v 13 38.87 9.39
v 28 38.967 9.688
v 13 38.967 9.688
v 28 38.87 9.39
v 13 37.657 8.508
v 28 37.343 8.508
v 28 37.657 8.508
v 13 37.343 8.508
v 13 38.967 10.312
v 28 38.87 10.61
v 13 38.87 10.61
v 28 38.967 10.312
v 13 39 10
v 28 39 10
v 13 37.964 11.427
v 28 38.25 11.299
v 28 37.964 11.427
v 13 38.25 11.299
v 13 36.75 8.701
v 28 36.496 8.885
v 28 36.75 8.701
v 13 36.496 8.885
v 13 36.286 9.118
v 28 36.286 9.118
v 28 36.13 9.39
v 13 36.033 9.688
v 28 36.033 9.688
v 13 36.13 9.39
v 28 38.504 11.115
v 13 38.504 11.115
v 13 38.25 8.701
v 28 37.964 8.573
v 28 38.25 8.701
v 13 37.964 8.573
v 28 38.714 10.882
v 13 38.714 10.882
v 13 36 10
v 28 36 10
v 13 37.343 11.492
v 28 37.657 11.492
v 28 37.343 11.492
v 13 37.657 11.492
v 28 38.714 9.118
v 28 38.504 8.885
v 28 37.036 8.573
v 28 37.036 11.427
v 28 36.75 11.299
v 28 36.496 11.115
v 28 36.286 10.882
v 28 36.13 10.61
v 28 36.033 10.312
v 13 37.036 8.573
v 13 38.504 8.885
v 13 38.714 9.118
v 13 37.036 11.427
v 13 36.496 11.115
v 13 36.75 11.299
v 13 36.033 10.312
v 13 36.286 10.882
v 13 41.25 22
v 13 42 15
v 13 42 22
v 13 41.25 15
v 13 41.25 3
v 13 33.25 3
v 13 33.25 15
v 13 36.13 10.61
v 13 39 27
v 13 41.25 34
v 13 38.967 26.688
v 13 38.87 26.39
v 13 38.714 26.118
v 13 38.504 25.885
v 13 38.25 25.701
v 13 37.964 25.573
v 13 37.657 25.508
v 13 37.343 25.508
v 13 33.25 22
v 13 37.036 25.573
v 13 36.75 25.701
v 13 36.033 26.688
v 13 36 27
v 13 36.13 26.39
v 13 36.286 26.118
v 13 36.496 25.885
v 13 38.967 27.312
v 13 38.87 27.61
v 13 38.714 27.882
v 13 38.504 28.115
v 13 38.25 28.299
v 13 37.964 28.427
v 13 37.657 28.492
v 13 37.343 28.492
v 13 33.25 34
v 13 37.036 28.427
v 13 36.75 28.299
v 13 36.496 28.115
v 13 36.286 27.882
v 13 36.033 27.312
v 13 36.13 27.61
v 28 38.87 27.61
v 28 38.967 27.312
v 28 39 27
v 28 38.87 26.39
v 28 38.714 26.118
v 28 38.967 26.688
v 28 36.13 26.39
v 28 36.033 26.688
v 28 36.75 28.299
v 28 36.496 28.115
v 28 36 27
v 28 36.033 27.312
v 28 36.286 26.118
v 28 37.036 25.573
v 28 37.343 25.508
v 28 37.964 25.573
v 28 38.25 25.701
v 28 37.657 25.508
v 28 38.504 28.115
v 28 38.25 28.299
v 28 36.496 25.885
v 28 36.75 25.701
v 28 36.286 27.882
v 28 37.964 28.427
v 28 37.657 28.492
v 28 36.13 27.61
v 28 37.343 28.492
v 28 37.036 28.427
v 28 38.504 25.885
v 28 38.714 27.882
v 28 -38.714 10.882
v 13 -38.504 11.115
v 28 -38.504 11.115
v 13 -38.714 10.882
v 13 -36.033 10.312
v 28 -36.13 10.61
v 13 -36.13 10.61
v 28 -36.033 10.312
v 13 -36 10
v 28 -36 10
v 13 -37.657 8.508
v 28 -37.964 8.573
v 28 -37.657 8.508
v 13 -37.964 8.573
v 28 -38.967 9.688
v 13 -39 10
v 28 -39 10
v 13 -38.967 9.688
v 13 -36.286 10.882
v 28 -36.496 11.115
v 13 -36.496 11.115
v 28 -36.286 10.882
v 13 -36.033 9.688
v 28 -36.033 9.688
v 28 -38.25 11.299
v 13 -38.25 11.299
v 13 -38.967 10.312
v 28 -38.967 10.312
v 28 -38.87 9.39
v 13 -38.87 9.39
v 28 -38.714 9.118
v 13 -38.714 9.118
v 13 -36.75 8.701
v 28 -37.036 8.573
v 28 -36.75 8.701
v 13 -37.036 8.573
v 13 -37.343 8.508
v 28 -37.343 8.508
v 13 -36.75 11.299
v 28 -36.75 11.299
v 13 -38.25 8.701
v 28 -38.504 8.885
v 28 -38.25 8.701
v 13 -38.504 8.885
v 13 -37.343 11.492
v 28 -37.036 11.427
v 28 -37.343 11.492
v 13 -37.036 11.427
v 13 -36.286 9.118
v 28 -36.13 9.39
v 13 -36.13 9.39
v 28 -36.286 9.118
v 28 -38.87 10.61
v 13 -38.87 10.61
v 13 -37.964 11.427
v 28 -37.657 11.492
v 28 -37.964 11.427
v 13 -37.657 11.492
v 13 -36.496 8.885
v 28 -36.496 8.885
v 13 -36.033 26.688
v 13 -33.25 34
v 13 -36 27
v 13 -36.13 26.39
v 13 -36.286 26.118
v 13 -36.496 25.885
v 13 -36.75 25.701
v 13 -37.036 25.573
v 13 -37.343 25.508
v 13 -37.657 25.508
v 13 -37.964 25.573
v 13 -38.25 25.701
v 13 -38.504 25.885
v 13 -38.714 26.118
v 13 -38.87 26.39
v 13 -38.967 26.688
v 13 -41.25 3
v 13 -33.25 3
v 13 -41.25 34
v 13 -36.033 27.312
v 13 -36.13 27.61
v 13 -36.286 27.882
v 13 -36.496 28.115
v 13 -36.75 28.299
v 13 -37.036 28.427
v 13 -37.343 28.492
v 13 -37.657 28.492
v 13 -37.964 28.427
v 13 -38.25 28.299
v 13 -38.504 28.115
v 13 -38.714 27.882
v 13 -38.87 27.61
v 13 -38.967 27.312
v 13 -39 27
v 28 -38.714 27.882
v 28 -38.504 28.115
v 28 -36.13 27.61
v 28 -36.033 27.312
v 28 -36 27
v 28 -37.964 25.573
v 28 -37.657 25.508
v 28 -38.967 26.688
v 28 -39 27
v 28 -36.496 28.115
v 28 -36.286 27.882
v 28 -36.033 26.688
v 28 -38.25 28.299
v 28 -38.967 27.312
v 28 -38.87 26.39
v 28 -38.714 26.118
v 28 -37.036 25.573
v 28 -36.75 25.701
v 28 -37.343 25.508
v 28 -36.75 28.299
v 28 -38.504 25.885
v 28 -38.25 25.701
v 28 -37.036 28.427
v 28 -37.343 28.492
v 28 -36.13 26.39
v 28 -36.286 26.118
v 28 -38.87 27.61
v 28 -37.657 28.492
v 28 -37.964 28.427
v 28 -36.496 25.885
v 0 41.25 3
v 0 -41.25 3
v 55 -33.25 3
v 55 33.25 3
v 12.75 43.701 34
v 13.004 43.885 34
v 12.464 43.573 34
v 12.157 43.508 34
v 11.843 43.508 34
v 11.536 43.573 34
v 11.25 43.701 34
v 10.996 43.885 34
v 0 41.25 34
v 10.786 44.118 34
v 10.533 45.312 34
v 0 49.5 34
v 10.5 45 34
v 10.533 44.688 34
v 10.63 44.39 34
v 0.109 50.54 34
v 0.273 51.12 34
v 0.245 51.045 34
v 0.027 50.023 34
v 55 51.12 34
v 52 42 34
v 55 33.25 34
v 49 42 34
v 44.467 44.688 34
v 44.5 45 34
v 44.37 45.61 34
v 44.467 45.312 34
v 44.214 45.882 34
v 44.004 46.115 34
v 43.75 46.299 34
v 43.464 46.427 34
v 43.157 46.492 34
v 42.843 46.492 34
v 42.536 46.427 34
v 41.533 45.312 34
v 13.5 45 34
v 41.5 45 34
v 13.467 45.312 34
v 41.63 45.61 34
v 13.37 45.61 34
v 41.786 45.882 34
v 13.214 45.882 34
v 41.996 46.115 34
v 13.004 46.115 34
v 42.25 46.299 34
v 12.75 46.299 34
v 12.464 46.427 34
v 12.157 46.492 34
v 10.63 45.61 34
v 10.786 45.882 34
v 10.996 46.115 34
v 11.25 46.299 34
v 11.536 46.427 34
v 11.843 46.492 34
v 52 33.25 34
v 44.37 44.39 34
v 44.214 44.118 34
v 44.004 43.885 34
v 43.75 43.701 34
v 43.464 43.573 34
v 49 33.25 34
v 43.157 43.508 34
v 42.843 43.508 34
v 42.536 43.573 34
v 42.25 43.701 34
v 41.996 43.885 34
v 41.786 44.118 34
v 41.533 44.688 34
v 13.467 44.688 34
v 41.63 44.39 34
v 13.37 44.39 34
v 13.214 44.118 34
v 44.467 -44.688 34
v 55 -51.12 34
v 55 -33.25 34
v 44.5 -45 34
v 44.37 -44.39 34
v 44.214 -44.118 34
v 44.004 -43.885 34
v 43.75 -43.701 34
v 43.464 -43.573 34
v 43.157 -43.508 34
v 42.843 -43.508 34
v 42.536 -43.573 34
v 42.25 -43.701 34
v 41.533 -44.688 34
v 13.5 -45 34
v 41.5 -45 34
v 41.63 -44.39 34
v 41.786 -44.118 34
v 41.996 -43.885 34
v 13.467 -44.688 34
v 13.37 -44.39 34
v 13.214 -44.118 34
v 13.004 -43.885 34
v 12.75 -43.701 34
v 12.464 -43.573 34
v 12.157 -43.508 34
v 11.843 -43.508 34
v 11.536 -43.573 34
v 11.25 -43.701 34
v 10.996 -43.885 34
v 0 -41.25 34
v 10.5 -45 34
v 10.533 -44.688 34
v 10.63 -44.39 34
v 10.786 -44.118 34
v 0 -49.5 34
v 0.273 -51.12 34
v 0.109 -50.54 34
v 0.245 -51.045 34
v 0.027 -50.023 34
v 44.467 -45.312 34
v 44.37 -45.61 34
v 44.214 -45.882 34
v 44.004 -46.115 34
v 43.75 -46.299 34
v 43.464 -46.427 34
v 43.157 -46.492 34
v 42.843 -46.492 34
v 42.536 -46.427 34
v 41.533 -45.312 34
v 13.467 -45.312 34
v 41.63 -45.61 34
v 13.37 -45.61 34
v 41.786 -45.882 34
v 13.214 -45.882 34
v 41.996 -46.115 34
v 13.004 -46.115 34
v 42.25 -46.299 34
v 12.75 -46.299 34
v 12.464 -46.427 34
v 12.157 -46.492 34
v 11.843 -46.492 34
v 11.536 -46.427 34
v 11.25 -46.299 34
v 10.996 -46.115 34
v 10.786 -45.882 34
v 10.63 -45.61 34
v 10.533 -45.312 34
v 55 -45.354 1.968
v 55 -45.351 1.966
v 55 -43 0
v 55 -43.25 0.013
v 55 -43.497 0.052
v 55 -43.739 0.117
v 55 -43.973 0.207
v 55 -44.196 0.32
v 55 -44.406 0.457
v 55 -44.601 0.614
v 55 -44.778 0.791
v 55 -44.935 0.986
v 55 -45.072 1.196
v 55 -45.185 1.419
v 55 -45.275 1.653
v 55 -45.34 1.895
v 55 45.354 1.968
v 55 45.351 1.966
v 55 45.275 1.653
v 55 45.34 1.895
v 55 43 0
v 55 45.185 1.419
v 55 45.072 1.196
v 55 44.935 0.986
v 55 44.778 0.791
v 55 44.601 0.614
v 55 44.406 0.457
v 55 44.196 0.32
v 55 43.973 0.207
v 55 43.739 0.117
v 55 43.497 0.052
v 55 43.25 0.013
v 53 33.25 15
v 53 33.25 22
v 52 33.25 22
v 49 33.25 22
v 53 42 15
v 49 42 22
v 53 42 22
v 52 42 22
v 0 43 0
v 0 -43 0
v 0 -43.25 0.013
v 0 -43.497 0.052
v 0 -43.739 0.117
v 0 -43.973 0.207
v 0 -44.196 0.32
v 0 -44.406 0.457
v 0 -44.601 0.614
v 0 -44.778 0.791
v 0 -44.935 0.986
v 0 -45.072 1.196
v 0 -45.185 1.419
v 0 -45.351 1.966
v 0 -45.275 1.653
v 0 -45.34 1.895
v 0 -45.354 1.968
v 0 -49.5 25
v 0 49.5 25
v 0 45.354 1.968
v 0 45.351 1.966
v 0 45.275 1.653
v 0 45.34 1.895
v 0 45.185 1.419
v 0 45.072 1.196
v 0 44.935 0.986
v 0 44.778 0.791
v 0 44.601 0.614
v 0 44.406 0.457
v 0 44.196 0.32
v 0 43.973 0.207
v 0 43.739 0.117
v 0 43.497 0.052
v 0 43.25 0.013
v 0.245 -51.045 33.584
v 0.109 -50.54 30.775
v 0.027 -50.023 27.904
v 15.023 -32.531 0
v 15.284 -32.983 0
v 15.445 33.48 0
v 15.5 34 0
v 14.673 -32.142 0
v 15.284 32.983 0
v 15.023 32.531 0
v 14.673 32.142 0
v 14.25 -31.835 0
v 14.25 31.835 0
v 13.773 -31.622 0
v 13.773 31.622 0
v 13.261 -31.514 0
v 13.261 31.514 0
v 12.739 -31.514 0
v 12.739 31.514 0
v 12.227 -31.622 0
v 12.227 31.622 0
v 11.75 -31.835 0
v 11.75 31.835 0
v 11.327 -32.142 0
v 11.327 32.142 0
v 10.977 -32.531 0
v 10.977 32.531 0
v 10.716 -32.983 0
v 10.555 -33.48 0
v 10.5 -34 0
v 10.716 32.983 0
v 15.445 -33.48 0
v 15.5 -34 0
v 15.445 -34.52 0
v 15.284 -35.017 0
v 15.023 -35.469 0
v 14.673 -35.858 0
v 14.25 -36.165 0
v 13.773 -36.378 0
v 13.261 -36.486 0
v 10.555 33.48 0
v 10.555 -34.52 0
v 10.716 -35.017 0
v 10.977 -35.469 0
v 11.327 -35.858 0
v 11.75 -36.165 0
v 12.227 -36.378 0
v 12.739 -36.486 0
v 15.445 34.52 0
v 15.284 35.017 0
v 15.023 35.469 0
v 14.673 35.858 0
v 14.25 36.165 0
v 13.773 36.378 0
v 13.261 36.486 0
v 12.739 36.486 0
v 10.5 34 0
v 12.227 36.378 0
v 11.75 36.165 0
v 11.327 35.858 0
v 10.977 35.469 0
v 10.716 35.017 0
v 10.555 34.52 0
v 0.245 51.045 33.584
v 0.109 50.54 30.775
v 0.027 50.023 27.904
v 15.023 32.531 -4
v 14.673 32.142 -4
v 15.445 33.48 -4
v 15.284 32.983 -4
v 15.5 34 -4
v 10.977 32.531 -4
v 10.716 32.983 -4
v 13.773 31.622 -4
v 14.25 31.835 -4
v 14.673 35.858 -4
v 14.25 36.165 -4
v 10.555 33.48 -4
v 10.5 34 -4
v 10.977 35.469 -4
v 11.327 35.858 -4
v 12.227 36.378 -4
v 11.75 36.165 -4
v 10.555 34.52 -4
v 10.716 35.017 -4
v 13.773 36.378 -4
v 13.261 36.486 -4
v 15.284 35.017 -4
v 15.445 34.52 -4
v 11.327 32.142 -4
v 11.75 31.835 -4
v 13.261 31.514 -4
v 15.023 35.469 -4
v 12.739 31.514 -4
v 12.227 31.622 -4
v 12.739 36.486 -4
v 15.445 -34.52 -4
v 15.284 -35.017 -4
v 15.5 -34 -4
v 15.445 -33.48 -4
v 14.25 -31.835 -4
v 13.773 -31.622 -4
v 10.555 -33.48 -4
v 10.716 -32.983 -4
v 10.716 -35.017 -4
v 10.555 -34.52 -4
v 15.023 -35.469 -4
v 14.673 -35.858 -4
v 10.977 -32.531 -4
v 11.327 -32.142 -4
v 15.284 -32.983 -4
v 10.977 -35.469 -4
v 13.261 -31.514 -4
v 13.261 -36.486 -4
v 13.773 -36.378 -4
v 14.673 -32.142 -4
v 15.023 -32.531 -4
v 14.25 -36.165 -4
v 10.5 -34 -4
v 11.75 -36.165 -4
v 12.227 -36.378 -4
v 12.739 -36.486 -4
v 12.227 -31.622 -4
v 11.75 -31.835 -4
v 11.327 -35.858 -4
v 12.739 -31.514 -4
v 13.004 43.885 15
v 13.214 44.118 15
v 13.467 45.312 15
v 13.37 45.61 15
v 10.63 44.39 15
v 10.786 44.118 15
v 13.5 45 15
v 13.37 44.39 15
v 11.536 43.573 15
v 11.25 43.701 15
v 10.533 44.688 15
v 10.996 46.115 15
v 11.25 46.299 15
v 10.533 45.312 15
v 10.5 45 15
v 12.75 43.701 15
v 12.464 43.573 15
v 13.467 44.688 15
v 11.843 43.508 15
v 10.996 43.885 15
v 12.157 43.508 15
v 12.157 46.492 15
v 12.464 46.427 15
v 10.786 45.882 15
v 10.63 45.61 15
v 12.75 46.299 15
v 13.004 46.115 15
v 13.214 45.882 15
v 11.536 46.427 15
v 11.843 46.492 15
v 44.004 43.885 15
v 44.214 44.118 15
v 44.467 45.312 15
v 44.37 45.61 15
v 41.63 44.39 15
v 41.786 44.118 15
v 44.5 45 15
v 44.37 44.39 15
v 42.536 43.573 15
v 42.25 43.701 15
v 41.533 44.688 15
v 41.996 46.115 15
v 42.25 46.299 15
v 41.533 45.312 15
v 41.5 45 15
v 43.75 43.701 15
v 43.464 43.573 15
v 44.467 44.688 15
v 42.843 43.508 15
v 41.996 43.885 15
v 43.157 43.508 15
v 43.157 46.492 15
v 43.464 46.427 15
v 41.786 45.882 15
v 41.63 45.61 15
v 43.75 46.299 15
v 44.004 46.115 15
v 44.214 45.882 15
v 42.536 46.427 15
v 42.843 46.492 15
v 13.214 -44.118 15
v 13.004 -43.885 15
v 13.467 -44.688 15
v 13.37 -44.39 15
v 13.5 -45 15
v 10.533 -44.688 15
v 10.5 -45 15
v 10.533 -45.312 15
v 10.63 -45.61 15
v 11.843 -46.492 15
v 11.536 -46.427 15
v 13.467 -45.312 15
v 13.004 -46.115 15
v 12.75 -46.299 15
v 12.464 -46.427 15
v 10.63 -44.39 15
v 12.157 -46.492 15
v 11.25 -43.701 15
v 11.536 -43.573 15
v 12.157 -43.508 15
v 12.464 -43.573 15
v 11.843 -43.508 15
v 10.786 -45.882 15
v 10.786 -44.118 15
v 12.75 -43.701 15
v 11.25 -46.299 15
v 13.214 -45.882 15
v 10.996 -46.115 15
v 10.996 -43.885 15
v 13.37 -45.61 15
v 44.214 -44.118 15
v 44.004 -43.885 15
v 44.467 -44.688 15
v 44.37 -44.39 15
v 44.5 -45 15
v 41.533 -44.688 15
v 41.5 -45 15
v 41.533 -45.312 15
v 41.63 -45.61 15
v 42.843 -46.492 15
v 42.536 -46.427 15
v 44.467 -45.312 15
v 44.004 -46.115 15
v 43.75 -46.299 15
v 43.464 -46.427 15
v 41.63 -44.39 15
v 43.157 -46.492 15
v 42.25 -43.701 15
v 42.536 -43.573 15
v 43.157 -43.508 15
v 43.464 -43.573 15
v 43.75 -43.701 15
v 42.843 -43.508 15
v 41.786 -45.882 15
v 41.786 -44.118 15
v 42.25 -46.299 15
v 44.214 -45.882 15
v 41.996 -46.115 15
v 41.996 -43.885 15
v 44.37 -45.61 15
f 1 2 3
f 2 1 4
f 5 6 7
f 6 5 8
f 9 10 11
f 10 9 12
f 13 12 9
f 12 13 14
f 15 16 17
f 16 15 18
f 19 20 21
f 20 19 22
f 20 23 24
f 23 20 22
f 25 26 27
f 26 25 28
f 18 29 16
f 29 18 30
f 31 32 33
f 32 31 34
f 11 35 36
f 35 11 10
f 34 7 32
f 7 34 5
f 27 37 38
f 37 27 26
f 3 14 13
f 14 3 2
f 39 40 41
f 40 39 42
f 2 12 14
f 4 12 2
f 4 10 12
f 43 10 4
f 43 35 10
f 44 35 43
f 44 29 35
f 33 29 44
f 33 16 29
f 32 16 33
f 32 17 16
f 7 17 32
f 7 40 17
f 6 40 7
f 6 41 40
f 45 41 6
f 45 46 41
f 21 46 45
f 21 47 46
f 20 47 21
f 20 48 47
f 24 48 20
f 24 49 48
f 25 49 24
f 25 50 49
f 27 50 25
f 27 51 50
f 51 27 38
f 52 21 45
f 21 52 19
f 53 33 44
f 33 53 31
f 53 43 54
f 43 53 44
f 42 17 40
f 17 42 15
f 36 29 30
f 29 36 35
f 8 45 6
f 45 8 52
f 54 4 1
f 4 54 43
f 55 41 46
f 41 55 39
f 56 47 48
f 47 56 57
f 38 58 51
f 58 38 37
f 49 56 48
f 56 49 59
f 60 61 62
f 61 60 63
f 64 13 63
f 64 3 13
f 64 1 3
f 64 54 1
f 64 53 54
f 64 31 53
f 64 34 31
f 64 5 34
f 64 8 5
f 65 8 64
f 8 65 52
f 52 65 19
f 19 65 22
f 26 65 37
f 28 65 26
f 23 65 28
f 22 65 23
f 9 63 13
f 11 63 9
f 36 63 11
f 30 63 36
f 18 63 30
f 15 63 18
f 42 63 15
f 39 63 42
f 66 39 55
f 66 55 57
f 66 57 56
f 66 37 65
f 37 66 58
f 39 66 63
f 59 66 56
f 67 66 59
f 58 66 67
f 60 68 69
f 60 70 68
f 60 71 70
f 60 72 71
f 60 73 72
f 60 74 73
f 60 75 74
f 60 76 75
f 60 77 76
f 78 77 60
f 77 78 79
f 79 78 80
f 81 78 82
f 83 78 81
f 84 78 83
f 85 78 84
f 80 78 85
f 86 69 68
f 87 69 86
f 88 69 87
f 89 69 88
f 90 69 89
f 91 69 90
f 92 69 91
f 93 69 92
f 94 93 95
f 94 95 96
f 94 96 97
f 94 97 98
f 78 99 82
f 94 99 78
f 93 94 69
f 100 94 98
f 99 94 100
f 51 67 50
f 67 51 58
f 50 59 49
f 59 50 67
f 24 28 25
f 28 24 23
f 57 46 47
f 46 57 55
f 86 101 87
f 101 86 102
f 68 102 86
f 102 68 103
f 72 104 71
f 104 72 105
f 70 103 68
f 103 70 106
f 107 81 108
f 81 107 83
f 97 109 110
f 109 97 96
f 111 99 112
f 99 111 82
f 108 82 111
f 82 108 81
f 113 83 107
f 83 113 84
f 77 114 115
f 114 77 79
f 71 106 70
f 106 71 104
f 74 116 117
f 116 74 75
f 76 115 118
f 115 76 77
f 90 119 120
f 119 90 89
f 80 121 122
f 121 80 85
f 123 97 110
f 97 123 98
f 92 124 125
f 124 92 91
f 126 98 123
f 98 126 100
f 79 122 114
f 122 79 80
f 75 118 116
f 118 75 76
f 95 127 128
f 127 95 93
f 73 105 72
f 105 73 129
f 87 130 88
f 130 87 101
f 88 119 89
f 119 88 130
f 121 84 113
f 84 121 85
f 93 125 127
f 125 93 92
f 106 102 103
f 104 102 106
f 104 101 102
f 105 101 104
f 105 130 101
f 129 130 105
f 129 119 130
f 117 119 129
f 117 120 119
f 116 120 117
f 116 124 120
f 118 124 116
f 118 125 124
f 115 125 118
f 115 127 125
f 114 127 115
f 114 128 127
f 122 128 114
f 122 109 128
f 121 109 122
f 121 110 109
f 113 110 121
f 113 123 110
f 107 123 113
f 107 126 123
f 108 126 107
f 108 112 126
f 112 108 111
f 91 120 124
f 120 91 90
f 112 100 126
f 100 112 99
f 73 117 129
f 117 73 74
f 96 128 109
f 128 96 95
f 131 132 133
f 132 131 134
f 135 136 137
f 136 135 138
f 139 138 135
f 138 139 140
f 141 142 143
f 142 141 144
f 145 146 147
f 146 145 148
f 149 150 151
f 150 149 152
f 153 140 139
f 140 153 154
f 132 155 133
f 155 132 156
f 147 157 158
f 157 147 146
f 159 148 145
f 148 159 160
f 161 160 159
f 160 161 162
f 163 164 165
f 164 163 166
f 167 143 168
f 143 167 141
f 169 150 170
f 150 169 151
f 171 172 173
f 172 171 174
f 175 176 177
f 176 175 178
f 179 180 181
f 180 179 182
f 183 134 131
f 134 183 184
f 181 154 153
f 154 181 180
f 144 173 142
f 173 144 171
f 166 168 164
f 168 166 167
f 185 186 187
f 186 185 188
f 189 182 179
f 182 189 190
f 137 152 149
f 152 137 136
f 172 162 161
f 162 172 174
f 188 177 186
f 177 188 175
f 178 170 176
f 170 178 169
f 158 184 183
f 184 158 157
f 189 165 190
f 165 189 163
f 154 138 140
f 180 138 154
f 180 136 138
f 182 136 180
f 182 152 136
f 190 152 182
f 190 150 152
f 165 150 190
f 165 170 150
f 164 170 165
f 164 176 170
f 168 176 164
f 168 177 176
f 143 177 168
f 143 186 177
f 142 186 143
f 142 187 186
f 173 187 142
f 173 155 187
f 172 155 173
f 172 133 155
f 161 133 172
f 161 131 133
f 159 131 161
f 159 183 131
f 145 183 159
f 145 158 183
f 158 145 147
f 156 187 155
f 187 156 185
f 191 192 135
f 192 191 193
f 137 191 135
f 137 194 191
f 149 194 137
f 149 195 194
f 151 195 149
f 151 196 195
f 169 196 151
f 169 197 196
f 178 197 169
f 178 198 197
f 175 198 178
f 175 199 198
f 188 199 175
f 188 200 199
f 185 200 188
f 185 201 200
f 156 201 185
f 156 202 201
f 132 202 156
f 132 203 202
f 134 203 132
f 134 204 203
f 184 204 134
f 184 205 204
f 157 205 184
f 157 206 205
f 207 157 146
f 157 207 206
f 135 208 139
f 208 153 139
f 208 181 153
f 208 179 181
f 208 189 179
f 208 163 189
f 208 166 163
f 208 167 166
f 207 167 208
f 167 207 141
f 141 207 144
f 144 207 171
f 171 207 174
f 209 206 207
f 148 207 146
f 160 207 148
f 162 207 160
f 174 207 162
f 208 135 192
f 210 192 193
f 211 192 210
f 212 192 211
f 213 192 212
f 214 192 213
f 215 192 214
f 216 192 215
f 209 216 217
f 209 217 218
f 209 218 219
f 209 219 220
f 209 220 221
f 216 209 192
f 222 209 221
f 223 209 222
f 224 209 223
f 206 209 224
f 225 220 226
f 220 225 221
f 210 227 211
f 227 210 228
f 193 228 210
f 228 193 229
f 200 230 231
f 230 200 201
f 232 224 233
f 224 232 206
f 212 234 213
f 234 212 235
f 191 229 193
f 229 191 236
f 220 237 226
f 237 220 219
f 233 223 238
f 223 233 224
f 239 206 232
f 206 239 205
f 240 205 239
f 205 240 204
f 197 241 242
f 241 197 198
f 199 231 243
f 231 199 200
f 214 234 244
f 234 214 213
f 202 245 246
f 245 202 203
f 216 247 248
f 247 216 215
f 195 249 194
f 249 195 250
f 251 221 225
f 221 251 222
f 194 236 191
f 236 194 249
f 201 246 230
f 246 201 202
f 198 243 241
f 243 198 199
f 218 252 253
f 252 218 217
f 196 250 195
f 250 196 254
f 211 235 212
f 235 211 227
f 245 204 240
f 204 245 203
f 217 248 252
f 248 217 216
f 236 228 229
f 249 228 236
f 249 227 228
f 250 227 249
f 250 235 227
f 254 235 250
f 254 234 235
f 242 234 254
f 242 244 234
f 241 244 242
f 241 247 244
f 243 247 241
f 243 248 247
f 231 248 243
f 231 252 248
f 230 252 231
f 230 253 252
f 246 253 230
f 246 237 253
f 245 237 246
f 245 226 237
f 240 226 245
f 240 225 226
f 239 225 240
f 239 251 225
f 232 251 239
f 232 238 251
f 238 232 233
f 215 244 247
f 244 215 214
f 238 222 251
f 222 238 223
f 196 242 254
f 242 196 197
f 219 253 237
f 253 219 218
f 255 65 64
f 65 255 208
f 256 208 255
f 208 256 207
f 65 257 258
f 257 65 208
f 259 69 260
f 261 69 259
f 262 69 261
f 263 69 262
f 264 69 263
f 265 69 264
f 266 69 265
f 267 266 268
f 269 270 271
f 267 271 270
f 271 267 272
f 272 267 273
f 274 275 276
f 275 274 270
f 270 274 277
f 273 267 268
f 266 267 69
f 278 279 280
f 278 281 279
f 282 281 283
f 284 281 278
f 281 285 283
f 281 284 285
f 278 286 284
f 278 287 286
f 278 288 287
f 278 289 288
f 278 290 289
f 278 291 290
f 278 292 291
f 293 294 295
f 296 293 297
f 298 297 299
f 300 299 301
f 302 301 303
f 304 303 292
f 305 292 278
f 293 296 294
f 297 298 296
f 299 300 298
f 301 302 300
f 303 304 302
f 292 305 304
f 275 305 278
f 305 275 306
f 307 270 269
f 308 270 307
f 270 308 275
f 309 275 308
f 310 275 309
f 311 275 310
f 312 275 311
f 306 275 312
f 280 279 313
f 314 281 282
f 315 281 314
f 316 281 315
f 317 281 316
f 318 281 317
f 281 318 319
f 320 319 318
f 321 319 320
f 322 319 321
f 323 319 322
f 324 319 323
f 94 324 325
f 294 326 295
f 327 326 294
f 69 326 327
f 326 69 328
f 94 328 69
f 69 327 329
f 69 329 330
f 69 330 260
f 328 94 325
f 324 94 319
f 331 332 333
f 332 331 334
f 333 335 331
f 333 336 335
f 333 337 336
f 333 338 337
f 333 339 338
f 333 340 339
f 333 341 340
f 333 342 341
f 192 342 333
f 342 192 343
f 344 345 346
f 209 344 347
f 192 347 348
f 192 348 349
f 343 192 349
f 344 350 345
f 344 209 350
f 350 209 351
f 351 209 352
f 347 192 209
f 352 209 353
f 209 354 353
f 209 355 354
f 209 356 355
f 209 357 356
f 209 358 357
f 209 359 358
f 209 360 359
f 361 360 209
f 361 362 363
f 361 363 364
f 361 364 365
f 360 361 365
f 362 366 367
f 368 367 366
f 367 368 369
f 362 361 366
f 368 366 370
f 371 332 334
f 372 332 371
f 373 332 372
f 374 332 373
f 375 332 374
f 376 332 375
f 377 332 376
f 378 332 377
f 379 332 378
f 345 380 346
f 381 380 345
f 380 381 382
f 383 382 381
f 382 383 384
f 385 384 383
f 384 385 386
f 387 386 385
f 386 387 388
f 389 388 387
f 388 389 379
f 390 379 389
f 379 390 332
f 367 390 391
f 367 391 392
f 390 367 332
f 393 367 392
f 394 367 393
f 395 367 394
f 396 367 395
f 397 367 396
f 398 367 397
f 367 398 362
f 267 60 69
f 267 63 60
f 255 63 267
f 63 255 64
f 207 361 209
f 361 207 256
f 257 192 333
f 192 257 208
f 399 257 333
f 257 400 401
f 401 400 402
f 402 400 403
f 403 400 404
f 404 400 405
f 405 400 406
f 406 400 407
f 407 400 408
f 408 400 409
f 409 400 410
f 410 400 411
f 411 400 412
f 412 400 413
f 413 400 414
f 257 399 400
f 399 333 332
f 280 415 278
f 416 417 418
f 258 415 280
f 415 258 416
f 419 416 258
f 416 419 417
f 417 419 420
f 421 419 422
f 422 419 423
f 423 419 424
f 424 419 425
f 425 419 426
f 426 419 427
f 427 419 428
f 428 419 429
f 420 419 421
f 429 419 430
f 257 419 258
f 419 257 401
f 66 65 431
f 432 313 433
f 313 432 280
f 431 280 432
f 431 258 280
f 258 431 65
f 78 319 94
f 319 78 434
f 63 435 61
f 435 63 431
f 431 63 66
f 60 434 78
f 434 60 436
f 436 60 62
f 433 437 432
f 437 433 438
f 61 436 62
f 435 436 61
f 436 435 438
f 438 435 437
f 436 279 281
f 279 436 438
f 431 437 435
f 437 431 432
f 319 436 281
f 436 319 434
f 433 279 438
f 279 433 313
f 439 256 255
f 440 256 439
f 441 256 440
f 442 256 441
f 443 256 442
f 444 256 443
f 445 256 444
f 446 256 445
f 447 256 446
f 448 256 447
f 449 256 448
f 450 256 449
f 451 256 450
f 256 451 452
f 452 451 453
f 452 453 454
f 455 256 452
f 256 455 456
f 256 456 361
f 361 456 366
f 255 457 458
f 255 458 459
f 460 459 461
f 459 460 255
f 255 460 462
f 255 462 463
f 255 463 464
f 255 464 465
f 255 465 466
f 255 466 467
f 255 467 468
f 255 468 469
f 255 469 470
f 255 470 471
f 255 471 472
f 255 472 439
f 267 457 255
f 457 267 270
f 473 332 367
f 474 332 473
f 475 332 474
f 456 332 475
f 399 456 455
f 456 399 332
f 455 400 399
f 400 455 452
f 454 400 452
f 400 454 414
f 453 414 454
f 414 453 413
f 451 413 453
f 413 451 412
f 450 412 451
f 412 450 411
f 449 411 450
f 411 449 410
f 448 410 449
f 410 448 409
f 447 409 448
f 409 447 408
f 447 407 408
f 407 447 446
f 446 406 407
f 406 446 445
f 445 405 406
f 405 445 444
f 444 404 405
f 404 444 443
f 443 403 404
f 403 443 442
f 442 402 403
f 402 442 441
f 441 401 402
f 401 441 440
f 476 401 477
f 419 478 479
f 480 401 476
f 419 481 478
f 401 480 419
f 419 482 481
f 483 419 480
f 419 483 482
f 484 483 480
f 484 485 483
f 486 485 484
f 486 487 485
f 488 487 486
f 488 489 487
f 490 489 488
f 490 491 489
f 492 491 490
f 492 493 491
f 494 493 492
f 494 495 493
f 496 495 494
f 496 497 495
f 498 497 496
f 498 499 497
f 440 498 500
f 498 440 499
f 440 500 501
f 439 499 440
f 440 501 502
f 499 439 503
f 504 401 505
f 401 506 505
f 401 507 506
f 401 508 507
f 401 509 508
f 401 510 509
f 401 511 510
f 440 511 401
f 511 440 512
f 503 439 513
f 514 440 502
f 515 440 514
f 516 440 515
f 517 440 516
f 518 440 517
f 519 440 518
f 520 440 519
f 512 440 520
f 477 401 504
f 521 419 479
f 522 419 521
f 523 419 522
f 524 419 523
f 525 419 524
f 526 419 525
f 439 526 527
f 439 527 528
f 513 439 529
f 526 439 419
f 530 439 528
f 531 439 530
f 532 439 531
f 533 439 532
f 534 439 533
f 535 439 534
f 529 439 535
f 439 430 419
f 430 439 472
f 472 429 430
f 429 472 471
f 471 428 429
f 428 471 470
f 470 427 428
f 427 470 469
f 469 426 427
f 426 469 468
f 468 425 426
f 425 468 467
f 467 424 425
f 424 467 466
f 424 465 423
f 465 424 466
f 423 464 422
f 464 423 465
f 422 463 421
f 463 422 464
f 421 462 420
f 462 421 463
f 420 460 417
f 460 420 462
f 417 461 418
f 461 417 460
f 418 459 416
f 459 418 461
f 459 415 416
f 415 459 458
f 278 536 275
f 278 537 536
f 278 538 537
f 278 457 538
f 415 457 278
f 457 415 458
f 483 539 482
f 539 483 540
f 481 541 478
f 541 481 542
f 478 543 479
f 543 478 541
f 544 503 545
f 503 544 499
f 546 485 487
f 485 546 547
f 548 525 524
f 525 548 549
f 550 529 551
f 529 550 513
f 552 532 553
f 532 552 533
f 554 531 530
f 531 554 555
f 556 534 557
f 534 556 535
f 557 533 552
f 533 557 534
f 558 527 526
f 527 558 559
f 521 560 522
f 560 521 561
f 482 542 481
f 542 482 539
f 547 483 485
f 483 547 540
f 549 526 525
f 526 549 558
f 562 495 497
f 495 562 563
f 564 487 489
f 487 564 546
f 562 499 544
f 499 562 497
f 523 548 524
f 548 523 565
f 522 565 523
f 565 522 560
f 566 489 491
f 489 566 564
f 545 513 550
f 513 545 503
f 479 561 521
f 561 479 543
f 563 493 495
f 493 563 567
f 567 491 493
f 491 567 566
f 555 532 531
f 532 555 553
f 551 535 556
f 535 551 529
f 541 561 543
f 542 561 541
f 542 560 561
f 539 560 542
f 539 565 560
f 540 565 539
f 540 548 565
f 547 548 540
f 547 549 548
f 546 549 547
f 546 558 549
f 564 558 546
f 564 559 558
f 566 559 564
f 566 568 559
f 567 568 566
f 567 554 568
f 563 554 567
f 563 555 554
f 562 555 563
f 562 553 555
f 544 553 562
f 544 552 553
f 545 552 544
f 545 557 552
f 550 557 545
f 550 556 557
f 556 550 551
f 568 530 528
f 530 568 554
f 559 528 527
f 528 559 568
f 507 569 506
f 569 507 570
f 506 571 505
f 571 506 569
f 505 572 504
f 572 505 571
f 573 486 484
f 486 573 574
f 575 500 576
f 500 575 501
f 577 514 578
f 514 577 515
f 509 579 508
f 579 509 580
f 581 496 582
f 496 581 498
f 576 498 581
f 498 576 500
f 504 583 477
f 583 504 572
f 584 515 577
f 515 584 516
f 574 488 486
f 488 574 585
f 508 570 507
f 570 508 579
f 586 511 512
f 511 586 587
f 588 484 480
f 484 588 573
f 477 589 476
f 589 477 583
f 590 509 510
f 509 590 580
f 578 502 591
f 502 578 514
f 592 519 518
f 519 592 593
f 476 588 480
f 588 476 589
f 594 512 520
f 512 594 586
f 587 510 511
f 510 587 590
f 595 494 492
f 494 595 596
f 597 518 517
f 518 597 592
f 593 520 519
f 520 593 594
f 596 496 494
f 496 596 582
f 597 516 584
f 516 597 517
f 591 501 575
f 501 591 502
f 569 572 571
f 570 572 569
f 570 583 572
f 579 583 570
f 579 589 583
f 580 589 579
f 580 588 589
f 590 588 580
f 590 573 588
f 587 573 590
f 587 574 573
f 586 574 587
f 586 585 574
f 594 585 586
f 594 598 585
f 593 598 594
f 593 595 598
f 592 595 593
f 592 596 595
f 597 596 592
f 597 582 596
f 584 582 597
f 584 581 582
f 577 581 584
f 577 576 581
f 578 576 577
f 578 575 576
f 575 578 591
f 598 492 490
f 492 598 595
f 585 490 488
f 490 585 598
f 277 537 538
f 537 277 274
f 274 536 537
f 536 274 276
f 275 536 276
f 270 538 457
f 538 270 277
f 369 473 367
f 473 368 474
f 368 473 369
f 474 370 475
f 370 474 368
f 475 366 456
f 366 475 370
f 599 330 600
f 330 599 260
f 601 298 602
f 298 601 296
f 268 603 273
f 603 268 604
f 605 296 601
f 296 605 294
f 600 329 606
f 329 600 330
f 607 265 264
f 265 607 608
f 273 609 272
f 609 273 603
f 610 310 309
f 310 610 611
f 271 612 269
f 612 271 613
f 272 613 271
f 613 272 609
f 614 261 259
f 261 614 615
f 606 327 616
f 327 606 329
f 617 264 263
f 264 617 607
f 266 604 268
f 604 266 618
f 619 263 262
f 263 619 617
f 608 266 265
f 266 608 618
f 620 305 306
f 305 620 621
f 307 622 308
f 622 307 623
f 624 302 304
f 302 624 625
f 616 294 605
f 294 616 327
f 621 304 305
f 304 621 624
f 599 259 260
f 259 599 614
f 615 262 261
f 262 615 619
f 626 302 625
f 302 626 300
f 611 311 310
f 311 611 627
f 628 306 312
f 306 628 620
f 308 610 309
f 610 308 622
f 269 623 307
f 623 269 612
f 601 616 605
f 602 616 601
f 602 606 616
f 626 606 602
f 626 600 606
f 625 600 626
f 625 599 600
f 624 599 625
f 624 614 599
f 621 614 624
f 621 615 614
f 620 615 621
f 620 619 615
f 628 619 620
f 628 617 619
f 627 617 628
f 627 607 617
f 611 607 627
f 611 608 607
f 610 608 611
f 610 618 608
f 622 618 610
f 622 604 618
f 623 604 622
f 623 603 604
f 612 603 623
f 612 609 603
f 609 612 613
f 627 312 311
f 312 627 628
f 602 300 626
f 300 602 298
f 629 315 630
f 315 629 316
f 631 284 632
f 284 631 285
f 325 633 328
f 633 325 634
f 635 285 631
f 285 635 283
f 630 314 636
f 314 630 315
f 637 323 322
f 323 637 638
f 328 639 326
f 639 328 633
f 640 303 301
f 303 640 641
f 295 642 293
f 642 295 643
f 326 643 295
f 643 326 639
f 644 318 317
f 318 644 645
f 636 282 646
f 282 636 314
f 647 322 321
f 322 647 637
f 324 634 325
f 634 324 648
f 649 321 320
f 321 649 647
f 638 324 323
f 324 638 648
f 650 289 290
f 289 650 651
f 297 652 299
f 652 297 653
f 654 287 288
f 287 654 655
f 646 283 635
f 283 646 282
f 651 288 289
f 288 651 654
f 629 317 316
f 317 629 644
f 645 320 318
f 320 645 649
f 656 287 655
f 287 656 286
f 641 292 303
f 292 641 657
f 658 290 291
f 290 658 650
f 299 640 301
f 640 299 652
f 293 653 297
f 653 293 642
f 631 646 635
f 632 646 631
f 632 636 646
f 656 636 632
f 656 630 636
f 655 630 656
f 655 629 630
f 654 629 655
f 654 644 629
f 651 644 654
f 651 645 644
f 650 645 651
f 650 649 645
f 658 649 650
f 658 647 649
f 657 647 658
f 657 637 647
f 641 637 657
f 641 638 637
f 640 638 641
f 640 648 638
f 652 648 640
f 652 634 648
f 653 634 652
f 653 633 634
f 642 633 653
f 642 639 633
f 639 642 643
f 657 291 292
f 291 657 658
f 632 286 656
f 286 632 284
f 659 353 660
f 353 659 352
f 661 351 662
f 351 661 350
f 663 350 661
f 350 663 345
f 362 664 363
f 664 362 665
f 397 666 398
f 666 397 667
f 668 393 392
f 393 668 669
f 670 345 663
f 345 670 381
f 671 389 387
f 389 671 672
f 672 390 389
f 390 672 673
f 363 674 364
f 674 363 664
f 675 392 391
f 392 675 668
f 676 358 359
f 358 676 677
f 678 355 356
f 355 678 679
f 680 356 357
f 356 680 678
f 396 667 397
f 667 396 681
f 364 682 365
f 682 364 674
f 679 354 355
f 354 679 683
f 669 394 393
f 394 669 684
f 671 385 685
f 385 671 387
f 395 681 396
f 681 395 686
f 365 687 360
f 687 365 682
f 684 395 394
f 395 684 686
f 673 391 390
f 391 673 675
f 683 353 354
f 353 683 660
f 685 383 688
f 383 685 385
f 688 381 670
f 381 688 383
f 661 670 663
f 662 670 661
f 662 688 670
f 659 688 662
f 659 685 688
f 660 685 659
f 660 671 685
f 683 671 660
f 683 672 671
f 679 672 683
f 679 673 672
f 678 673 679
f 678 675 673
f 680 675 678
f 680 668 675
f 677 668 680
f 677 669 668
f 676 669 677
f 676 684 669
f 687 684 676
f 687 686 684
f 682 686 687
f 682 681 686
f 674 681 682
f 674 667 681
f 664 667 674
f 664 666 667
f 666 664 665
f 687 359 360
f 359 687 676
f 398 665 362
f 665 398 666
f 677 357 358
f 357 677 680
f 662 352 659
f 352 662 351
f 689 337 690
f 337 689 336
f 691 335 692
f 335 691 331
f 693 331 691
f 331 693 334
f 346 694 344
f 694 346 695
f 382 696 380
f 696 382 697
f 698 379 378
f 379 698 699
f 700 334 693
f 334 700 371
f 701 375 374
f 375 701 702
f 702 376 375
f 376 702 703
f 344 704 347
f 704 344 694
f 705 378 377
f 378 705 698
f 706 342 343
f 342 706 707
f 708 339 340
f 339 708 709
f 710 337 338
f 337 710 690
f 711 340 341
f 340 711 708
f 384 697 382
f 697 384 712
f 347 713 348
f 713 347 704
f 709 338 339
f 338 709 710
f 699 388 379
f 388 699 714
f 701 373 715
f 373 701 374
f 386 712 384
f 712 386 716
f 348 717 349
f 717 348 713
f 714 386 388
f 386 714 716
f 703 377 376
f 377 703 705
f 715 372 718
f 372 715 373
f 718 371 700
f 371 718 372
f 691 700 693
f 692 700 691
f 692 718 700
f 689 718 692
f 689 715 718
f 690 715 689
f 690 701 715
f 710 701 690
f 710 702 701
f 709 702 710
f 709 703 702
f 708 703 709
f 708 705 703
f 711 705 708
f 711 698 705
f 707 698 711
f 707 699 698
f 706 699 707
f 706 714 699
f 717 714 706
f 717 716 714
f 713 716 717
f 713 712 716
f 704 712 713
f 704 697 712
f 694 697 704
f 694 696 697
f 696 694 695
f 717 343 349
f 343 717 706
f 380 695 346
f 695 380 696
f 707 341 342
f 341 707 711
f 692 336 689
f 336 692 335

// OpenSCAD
// file: utils.scad
// Private variables
HEIGHT = 50;

TOP_WIDTH_NO_FILLET = 108;
BOTTOM_WIDTH_NO_FILLET = 90;

TOP_FILLET_RADIUS = 5;
BOTTOM_FILLET_RADIUS = 2;


// Public prameters
function height() = HEIGHT;
function bottom_width_no_fillet() = BOTTOM_WIDTH_NO_FILLET;
function top_width_no_fillet() = TOP_WIDTH_NO_FILLET;
function bottom_fillet_radius() = BOTTOM_FILLET_RADIUS;
function top_fillet_radius() = TOP_FILLET_RADIUS;

function wall_angle() = 90+atan2((top_width_no_fillet()-bottom_width_no_fillet())/2, height());


inside_frame_profile();


module fillet(r, a=90) {
    p1 = [r,0];
    p2 = [sin(90-a)*r, sin(a)*r];
    dist = sqrt( pow(p2[0]-p1[0], 2) + pow(p2[1]-p1[1] ,2) );
    cr = (dist/2) / sin( (180-a)/2 );

    difference() {
        polygon([[0,0],p1,p2]);
        translate([r,cr]) circle(r=cr);
    }
}

module inside_frame_profile(offsets=[0,0,0]) {
          
    bottom_offset = offsets[0];
    top_offset = offsets[1];
    side_offset = offsets[2];

    right_bottom =  [bottom_offset,     -bottom_width_no_fillet()/2 + (sin(90-wall_angle())*bottom_offset) + side_offset];
    right_top =     [height()-top_offset, -top_width_no_fillet()/2    - (sin(90-wall_angle())*top_offset)    + side_offset];
    left_top =      [height()-top_offset,  top_width_no_fillet()/2    + (sin(90-wall_angle())*top_offset)    - side_offset];
    left_bottom =   [bottom_offset,      bottom_width_no_fillet()/2 - (sin(90-wall_angle())*bottom_offset) - side_offset];
    
    difference() {
        polygon([right_bottom, right_top, left_top, left_bottom]);
        translate([0,bottom_width_no_fillet()/2]) rotate([0,0,-90]) fillet(bottom_fillet_radius(), wall_angle(), $fn=60);
        translate([0,-bottom_width_no_fillet()/2]) rotate([0,0,-90]) mirror([1,0,0]) fillet(bottom_fillet_radius(), wall_angle(), $fn=60);
    }
}
// main file
use <utils.scad>;


WALL_THICKNESS = 3;


steering_servo_box_assembly(55);



module steering_servo_box_assembly(length) {
    intersection() {
        translate([0, -150/2, -5]) linear_extrude(34+5) square([length+20, 150]);
        difference() {
            steering_servo_box(length, $fn=60);
            
            // Assembly screw holes
            for (pos=[[12, bottom_width_no_fillet()/2], [length-12, bottom_width_no_fillet()/2], [12, -bottom_width_no_fillet()/2], [length-12, -bottom_width_no_fillet()/2]]) { 
                translate([pos[0], pos[1], 15]) linear_extrude(height()) circle(d=3, $fn=30);
                translate([pos[0], pos[1], 40]) linear_extrude(20) circle(d=3.5, $fn=30);
                translate([pos[0], pos[1], 36]) linear_extrude(3) circle(d=8, $fn=30);
            }
        }
    }
}


module steering_servo_box(length) {
    difference() {
        union() {
            difference() {
                rotate([0,-90,180]) linear_extrude(length) inside_frame_profile(offsets=[0,0,0]);
                translate([WALL_THICKNESS, 0]) rotate([0,-90,180]) linear_extrude(length-WALL_THICKNESS*2) inside_frame_profile(offsets=[34+2,0,WALL_THICKNESS]);
                translate([55,0,3]) rotate([0,0,90]) jumbo_servo_cutout();
            }
            
            // bottom stands
            translate([13,68/2,0]) rotate([180,0,0]) linear_extrude(4) circle(d=5, $fn=30);
            translate([13,-68/2,0]) rotate([180,0,0]) linear_extrude(4) circle(d=5, $fn=30);

            // mounting wings
            translate([0,0,height()]) mounting_wing(length, thickness=10);
            
            *translate([0,0,height()]) sealing_ledge(size=[length, top_width_no_fillet()]);
        }
        
        // fillets under wing 1 and 3
        translate([0, (top_width_no_fillet()+1)/2,0]) rotate([0, 0, -90]) linear_extrude(3+height()) fillet(5, 90);
        translate([0, -(top_width_no_fillet()+1)/2,0]) rotate([0, 0, 0]) linear_extrude(3+height()) fillet(5, 90);
        
    }
    //#translate([55,0,4]) rotate([0,0,90]) jumbo_servo();
}



module sealing_ledge(size=[0,0]) {
    translate([0, -size[1]/2, 0]) linear_extrude(10) difference() {
        square(size);
        translate([10,10]/2) square(size-[10,10]);
        
    }
}



module mounting_wing(length, thickness=6) {
       
    pad_od=12;
    pad_id=7;
    cross_pad_dist = 128;
    
    pad1=[11, cross_pad_dist/2];
    pad2=[11+43, cross_pad_dist/2];
    pad3=[11, -cross_pad_dist/2];
    pad4=[11+43, -cross_pad_dist/2];
    
    // constrain back of wing 2 and 4
    pads_back = length > (pad2[0]+pad_od) ? (pad2[0]+pad_od) : length;
    
    // wing edge around compartment
    difference() {
        rotate([0,-90,180]) linear_extrude(length) polygon([
            [0, top_width_no_fillet()/2],
            [thickness, -tan(90-wall_angle())*thickness+(top_width_no_fillet()/2)],
            [thickness, tan(90-wall_angle())*thickness-(top_width_no_fillet()/2)],
            [0, -top_width_no_fillet()/2]
        ]);
        
        translate([WALL_THICKNESS,0,0]) rotate([0,-90,180]) linear_extrude(length-WALL_THICKNESS*2) polygon([
            [0, top_width_no_fillet()/2-WALL_THICKNESS],
            [thickness, -tan(90-wall_angle())*thickness+(top_width_no_fillet()/2)-WALL_THICKNESS],
            [thickness, tan(90-wall_angle())*thickness-(top_width_no_fillet()/2)+WALL_THICKNESS],
            [0, -top_width_no_fillet()/2+WALL_THICKNESS]
        ]);
    }
    
    intersection() {
        difference() {
            linear_extrude(thickness) {
                for (pos=[pad1,pad2,pad3,pad4]) translate(pos) circle(d=pad_od);

                // pad 1 wing
                polygon([
                    [0, top_width_no_fillet()/2],
                    [pad1[0]-pad_od/2, pad1[1]],
                    [pad1[0]+pad_od/2, pad1[1]],
                    [pad1[0]*2, top_width_no_fillet()/2],
                ]);
                
                // pad 2 wing
                polygon([
                    [pads_back, top_width_no_fillet()/2],
                    [pad2[0]-pad_od, top_width_no_fillet()/2],
                    [pad2[0]-pad_od/2, pad2[1]],
                    [pad2[0]+pad_od/2, pad2[1]],
                ]);
                
                // pad 3 wing
                polygon([
                    [0, -top_width_no_fillet()/2],
                    [pad3[0]-pad_od/2, pad3[1]],
                    [pad3[0]+pad_od/2, pad3[1]],
                    [pad3[0]*2, -top_width_no_fillet()/2],
                ]);
                
                // pad 4 wing
                polygon([
                    [pads_back, -top_width_no_fillet()/2],
                    [pad4[0]-pad_od, -top_width_no_fillet()/2],
                    [pad4[0]-pad_od/2, pad4[1]],
                    [pad4[0]+pad_od/2, pad4[1]],
                ]);
            }
            
            // throughhole on all pads
            for (pos=[pad1,pad2,pad3,pad4]) translate(pos) linear_extrude(thickness) circle(d=pad_id);
        }
        
        // Fix position and extrusion of wings
        union() {
            translate([pad1[0], pad1[1], 3]) linear_extrude(3) square([pad1[0]*2, 20], true);
            translate([pad2[0], pad2[1], 0]) linear_extrude(3) square([pad1[0]*3, 20], true);
            translate([pad3[0], pad3[1], 3]) linear_extrude(3) square([pad1[0]*2, 20], true);
            translate([pad4[0], pad4[1], 0]) linear_extrude(3) square([pad1[0]*3, 20], true);
        }
    }
}



module jumbo_servo_cutout() {
    linear_extrude(31) {
        polygon([
            [66.5/2, 0],
            [66.5/2, 42],
            [82.5/2, 42],
            [82.5/2, 58],
            [-82.5/2, 58],
            [-82.5/2, 42],
            [-66.5/2, 42],
            [-66.5/2, 0]
        ]);
    }
    
    // Mounting holes
    for (p=[[75/2,42,7], [75/2,42,31-7], [-75/2,42,7], [-75/2,42,31-7] ]) translate(p) rotate([90,0,0]) linear_extrude(15) circle(d=3, $fn=30);
    
    // Wire groove
    translate([66/2,2,31/2-7/2]) linear_extrude(7) square([9,40]);
    translate([66/2,WALL_THICKNESS,31/2-7/2]) linear_extrude(30) square([9,3]);
}


module jumbo_servo() {
    linear_extrude(30) {
        polygon([
            [66/2, 0],
            [66/2, 50],
            [41/2, 58],
            [-41/2, 58],
            [-66/2, 50],
            [-66/2, 0]
        ]);
        translate([-82/2, 42, 0]) square([82, 4]);
    } 
}
